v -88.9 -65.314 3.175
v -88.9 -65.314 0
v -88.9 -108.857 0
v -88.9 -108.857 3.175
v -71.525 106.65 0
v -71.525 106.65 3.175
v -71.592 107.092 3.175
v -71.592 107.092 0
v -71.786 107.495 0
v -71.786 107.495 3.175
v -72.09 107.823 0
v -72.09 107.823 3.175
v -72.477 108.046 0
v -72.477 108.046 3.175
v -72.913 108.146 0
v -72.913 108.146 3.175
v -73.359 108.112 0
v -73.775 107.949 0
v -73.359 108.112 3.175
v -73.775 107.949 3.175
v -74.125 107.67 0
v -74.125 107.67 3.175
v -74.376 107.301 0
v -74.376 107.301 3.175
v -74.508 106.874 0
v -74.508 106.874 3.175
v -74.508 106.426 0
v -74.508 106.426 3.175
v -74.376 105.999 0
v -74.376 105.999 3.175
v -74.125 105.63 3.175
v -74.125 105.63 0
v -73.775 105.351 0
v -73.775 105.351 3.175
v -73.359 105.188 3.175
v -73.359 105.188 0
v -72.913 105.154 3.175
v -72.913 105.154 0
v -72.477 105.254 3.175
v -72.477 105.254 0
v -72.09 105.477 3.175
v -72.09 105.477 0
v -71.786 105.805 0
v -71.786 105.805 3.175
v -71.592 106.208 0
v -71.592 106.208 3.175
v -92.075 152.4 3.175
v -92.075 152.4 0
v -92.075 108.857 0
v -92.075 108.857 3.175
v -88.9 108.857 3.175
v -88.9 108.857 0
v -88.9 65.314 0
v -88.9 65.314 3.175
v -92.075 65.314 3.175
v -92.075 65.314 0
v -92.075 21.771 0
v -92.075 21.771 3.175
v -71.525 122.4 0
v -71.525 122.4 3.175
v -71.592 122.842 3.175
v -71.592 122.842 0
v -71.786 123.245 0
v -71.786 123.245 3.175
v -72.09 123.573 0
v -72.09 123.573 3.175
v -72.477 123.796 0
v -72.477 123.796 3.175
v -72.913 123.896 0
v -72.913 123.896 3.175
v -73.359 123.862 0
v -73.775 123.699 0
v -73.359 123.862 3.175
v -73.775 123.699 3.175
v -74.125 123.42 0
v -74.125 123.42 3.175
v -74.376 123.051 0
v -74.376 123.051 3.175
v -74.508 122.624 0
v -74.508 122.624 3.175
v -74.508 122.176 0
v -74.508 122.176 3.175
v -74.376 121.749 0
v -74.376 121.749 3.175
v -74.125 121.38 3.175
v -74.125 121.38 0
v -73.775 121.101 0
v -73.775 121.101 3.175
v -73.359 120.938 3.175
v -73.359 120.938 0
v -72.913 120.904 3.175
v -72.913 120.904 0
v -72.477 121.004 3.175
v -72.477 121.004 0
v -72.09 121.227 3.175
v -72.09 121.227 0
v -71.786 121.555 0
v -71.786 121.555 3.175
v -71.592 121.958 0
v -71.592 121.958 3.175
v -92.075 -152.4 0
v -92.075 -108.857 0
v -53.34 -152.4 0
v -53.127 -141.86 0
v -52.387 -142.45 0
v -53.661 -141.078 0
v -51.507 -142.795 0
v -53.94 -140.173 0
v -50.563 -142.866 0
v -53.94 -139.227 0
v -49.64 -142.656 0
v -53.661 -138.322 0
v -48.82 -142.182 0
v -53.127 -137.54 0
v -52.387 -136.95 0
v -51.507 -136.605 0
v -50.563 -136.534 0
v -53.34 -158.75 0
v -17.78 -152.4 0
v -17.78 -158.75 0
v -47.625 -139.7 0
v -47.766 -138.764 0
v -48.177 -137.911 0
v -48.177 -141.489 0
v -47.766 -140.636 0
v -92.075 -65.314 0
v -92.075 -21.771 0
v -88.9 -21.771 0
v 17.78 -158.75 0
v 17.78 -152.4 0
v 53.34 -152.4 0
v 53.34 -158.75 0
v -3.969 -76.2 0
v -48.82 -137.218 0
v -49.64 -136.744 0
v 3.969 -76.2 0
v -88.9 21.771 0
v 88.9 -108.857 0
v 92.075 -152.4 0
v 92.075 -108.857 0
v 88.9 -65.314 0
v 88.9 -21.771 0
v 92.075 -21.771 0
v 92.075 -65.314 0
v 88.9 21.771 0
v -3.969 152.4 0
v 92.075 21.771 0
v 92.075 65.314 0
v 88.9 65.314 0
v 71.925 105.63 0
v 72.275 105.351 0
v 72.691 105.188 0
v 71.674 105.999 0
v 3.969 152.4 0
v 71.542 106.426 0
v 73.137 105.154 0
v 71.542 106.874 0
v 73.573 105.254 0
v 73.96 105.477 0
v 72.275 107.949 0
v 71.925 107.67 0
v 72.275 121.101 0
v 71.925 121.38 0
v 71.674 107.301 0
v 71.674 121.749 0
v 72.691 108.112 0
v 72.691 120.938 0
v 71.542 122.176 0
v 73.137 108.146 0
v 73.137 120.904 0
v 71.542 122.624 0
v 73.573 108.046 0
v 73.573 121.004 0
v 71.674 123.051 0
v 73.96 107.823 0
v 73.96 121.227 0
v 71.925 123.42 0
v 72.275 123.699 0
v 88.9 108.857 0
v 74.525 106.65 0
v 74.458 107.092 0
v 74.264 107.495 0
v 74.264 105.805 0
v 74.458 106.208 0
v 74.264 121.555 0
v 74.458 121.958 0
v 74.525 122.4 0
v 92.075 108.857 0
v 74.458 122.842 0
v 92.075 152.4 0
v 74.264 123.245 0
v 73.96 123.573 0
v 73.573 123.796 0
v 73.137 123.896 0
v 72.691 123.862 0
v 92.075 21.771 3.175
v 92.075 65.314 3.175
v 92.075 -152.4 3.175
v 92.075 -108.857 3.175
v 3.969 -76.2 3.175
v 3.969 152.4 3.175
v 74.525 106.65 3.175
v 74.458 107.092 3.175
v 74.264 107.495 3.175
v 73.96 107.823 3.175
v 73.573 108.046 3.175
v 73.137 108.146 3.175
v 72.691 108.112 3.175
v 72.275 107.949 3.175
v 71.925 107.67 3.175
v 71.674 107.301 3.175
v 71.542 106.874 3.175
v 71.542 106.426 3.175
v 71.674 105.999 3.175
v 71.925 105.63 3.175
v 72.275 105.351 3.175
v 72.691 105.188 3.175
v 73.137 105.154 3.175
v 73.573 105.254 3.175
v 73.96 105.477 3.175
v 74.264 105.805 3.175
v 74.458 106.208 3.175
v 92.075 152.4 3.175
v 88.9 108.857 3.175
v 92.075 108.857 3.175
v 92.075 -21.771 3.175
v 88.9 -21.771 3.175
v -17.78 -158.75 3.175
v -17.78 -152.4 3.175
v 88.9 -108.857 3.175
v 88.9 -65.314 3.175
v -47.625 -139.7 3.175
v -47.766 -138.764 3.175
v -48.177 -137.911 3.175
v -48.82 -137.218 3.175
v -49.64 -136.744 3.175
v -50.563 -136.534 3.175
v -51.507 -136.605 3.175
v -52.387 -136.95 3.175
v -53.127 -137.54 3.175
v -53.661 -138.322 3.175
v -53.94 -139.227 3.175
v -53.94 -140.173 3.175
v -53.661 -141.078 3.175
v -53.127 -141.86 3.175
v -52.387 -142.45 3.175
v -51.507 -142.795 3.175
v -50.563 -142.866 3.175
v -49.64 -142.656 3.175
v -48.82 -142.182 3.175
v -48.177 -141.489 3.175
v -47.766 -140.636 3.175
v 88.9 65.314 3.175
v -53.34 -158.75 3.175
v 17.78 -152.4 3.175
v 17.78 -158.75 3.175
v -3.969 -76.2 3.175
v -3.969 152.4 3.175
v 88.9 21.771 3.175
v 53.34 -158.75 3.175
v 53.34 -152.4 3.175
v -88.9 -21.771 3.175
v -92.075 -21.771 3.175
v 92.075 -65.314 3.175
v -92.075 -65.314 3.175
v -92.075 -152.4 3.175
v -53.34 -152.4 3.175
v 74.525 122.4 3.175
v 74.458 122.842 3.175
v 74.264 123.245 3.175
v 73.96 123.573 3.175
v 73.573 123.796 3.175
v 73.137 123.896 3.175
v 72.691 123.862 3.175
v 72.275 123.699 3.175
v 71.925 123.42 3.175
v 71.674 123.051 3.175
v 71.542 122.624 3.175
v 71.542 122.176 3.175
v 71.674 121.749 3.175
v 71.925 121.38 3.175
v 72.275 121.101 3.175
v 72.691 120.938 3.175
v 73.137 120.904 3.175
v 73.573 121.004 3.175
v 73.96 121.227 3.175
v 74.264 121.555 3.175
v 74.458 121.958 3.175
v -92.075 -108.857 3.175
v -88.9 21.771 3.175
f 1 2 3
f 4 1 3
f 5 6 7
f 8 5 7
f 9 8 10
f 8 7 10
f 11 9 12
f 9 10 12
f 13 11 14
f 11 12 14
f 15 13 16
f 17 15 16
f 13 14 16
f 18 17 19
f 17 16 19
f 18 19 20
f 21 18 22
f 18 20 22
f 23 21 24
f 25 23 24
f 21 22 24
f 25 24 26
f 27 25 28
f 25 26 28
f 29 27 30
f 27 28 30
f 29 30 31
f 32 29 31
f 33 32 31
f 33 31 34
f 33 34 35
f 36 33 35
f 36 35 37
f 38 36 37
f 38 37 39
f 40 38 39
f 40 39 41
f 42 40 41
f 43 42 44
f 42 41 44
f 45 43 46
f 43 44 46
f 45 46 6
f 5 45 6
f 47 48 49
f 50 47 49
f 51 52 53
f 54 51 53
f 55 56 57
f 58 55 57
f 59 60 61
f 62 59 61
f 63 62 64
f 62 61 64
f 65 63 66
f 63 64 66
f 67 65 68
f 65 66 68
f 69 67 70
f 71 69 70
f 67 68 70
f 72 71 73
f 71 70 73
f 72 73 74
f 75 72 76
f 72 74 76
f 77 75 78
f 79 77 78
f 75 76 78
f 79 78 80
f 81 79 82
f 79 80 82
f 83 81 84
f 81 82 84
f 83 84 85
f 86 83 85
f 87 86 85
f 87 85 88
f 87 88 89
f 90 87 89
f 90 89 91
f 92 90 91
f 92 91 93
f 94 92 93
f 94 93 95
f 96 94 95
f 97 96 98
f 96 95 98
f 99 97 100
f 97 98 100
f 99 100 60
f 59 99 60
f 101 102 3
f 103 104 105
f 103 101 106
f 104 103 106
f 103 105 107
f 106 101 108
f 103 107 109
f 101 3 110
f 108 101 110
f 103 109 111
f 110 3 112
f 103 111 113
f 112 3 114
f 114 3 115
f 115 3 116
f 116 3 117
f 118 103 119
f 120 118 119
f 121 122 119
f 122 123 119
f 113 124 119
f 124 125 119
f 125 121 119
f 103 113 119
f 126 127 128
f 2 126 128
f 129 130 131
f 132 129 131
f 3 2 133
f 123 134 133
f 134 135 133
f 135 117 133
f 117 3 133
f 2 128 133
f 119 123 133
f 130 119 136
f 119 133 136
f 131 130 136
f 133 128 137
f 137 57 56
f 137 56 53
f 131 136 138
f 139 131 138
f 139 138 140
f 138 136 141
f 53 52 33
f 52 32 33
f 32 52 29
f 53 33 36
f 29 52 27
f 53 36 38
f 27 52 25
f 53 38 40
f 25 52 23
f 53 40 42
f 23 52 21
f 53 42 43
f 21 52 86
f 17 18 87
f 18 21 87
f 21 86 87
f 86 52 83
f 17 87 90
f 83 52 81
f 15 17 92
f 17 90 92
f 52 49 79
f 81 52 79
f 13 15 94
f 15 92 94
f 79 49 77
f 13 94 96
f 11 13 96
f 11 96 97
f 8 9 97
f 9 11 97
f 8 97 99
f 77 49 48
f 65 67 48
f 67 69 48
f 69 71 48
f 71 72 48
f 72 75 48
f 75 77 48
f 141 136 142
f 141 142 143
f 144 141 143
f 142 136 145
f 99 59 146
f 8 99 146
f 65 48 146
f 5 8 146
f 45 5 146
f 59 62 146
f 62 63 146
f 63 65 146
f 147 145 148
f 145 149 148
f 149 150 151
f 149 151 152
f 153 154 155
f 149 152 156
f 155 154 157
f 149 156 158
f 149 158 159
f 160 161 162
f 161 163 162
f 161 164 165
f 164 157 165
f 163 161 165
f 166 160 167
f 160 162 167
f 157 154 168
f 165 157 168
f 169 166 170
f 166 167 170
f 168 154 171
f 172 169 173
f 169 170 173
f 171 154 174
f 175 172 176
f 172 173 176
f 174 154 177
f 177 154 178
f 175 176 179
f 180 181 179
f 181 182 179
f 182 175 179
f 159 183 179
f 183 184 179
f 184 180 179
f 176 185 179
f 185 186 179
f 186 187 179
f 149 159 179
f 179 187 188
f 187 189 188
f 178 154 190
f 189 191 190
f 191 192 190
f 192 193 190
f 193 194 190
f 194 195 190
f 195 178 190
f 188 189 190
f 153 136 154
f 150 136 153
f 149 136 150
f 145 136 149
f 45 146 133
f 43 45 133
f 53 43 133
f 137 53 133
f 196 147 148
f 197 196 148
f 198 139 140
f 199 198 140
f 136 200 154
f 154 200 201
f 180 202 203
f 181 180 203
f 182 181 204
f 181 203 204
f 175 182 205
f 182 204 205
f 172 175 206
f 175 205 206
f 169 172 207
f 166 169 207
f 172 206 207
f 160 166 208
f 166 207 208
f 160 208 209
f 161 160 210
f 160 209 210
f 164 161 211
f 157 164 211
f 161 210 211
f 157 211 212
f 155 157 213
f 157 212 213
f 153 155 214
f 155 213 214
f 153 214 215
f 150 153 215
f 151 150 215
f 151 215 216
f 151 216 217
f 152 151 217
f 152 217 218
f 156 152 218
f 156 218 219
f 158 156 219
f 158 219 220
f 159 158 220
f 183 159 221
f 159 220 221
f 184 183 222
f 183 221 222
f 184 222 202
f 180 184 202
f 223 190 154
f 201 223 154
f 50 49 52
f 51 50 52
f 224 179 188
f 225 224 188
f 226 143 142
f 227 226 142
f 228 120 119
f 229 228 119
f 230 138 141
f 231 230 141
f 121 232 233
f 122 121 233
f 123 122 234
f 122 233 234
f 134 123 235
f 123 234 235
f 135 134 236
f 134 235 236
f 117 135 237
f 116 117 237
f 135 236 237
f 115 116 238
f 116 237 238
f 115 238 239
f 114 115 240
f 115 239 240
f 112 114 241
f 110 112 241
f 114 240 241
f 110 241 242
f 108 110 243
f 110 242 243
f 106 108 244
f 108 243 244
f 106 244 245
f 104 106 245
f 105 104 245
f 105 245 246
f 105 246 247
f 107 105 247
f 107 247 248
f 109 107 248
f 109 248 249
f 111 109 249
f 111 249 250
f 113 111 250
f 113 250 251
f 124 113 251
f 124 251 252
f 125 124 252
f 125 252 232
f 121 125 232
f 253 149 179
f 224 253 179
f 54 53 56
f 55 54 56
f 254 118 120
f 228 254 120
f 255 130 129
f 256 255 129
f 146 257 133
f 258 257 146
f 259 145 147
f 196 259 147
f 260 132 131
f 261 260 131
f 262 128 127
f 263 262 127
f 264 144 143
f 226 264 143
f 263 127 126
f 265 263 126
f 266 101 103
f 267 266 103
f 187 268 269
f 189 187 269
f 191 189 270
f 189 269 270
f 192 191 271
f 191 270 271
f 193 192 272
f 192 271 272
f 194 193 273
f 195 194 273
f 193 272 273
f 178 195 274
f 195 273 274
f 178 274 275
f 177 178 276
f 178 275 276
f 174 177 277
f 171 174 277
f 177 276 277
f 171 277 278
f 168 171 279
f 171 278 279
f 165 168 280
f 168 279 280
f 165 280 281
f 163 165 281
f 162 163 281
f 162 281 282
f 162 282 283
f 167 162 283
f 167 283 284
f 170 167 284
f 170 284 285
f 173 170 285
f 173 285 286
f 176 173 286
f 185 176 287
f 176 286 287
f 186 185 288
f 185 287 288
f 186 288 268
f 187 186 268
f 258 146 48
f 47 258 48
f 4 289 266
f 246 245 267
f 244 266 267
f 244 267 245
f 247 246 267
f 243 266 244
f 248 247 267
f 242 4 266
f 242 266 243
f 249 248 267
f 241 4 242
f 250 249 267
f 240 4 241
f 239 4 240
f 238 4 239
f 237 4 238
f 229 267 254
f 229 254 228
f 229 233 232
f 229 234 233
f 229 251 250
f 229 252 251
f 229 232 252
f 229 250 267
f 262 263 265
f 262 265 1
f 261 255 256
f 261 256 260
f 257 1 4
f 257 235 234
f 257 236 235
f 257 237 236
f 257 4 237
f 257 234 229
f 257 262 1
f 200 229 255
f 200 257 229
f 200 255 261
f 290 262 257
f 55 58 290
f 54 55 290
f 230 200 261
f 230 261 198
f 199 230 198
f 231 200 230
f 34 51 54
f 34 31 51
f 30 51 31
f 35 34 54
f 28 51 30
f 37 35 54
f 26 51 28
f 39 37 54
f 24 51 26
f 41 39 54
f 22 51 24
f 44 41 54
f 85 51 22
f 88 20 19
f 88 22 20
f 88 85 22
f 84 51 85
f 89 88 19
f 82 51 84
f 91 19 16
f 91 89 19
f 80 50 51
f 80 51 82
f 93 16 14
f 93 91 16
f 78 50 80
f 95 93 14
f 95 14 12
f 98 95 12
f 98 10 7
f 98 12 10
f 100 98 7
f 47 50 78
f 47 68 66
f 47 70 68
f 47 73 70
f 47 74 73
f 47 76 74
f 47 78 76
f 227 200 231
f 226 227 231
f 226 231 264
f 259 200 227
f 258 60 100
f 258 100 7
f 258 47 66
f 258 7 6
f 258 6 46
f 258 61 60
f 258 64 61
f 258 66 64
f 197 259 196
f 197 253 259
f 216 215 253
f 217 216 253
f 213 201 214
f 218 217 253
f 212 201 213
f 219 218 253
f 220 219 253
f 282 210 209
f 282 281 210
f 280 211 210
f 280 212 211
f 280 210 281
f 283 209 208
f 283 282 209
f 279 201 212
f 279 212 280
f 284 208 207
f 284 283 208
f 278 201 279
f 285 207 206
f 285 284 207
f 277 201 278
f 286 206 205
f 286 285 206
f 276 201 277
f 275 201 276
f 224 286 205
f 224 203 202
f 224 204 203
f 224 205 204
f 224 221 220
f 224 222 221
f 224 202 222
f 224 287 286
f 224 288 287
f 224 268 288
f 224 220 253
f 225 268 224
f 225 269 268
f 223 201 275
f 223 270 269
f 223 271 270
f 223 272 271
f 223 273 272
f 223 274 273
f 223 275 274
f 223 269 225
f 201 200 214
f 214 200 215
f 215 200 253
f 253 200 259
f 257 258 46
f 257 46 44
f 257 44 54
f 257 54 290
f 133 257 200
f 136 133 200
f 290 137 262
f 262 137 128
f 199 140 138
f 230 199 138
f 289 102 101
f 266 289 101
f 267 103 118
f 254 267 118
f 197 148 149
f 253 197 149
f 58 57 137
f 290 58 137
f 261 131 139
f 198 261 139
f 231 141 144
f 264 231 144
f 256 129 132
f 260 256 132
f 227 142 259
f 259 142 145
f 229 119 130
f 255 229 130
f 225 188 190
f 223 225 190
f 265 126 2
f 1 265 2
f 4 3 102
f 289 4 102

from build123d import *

# Parameters (mm, degrees)
BOSS_EXTRUDE1_DEPTH = 3.175
SKETCH3_W           = 7.9375
SKETCH3_H           = 228.6
CUT_EXTRUDE1_DEPTH  = 184.546857096
SKETCH4_R           = 3.175
CUT_EXTRUDE2_DEPTH  = 184.546857096
SKETCH5_R           = 1.5
CUT_EXTRUDE3_DEPTH  = 3.175


with BuildPart() as part:
    # Sketch2 → Boss-Extrude1 (new body)
    with BuildSketch(Plane.XY):
        Polygon((-92.075, 152.4), (-92.075, 108.857142857), (-88.9, 108.857142857), (-88.9, 65.314285714), (-92.075, 65.314285714), (-92.075, 21.771428571), (-88.9, 21.771428571), (-88.9, -21.771428571), (-92.075, -21.771428571), (-92.075, -65.314285714), (-88.9, -65.314285714), (-88.9, -108.857142857), (-92.075, -108.857142857), (-92.075, -152.4), (-53.34, -152.4), (-53.34, -158.75), (-17.78, -158.75), (-17.78, -152.4), (17.78, -152.4), (17.78, -158.75), (53.34, -158.75), (53.34, -152.4), (92.075, -152.4), (92.075, -108.857142857), (88.9, -108.857142857), (88.9, -65.314285714), (92.075, -65.314285714), (92.075, -21.771428571), (88.9, -21.771428571), (88.9, 21.771428571), (92.075, 21.771428571), (92.075, 65.314285714), (88.9, 65.314285714), (88.9, 108.857142857), (92.075, 108.857142857), (92.075, 152.4), align=None)
    extrude(amount=BOSS_EXTRUDE1_DEPTH)

    # Sketch3 → Cut-Extrude1 (cut, through all)
    with BuildSketch(Plane.XY.offset(3.175)):
        with Locations((0, 38.1)):
            Rectangle(SKETCH3_W, SKETCH3_H)
    extrude(amount=-CUT_EXTRUDE1_DEPTH, mode=Mode.SUBTRACT)

    # Sketch4 → Cut-Extrude2 (cut, through all)
    with BuildSketch(Plane.XY.offset(3.175)):
        with Locations((-50.8, -139.7)):
            Circle(SKETCH4_R)
    extrude(amount=-CUT_EXTRUDE2_DEPTH, mode=Mode.SUBTRACT)

    # Sketch5 → Cut-Extrude3 (cut)
    with BuildSketch(Plane.XY.offset(3.175)):
        with Locations((-73.025, 122.4)):
            Circle(SKETCH5_R)
        with Locations((-73.025, 106.65)):
            Circle(SKETCH5_R)
        with Locations((73.025, 122.4)):
            Circle(SKETCH5_R)
        with Locations((73.025, 106.65)):
            Circle(SKETCH5_R)
    extrude(amount=-CUT_EXTRUDE3_DEPTH, mode=Mode.SUBTRACT)


solid = part.part
